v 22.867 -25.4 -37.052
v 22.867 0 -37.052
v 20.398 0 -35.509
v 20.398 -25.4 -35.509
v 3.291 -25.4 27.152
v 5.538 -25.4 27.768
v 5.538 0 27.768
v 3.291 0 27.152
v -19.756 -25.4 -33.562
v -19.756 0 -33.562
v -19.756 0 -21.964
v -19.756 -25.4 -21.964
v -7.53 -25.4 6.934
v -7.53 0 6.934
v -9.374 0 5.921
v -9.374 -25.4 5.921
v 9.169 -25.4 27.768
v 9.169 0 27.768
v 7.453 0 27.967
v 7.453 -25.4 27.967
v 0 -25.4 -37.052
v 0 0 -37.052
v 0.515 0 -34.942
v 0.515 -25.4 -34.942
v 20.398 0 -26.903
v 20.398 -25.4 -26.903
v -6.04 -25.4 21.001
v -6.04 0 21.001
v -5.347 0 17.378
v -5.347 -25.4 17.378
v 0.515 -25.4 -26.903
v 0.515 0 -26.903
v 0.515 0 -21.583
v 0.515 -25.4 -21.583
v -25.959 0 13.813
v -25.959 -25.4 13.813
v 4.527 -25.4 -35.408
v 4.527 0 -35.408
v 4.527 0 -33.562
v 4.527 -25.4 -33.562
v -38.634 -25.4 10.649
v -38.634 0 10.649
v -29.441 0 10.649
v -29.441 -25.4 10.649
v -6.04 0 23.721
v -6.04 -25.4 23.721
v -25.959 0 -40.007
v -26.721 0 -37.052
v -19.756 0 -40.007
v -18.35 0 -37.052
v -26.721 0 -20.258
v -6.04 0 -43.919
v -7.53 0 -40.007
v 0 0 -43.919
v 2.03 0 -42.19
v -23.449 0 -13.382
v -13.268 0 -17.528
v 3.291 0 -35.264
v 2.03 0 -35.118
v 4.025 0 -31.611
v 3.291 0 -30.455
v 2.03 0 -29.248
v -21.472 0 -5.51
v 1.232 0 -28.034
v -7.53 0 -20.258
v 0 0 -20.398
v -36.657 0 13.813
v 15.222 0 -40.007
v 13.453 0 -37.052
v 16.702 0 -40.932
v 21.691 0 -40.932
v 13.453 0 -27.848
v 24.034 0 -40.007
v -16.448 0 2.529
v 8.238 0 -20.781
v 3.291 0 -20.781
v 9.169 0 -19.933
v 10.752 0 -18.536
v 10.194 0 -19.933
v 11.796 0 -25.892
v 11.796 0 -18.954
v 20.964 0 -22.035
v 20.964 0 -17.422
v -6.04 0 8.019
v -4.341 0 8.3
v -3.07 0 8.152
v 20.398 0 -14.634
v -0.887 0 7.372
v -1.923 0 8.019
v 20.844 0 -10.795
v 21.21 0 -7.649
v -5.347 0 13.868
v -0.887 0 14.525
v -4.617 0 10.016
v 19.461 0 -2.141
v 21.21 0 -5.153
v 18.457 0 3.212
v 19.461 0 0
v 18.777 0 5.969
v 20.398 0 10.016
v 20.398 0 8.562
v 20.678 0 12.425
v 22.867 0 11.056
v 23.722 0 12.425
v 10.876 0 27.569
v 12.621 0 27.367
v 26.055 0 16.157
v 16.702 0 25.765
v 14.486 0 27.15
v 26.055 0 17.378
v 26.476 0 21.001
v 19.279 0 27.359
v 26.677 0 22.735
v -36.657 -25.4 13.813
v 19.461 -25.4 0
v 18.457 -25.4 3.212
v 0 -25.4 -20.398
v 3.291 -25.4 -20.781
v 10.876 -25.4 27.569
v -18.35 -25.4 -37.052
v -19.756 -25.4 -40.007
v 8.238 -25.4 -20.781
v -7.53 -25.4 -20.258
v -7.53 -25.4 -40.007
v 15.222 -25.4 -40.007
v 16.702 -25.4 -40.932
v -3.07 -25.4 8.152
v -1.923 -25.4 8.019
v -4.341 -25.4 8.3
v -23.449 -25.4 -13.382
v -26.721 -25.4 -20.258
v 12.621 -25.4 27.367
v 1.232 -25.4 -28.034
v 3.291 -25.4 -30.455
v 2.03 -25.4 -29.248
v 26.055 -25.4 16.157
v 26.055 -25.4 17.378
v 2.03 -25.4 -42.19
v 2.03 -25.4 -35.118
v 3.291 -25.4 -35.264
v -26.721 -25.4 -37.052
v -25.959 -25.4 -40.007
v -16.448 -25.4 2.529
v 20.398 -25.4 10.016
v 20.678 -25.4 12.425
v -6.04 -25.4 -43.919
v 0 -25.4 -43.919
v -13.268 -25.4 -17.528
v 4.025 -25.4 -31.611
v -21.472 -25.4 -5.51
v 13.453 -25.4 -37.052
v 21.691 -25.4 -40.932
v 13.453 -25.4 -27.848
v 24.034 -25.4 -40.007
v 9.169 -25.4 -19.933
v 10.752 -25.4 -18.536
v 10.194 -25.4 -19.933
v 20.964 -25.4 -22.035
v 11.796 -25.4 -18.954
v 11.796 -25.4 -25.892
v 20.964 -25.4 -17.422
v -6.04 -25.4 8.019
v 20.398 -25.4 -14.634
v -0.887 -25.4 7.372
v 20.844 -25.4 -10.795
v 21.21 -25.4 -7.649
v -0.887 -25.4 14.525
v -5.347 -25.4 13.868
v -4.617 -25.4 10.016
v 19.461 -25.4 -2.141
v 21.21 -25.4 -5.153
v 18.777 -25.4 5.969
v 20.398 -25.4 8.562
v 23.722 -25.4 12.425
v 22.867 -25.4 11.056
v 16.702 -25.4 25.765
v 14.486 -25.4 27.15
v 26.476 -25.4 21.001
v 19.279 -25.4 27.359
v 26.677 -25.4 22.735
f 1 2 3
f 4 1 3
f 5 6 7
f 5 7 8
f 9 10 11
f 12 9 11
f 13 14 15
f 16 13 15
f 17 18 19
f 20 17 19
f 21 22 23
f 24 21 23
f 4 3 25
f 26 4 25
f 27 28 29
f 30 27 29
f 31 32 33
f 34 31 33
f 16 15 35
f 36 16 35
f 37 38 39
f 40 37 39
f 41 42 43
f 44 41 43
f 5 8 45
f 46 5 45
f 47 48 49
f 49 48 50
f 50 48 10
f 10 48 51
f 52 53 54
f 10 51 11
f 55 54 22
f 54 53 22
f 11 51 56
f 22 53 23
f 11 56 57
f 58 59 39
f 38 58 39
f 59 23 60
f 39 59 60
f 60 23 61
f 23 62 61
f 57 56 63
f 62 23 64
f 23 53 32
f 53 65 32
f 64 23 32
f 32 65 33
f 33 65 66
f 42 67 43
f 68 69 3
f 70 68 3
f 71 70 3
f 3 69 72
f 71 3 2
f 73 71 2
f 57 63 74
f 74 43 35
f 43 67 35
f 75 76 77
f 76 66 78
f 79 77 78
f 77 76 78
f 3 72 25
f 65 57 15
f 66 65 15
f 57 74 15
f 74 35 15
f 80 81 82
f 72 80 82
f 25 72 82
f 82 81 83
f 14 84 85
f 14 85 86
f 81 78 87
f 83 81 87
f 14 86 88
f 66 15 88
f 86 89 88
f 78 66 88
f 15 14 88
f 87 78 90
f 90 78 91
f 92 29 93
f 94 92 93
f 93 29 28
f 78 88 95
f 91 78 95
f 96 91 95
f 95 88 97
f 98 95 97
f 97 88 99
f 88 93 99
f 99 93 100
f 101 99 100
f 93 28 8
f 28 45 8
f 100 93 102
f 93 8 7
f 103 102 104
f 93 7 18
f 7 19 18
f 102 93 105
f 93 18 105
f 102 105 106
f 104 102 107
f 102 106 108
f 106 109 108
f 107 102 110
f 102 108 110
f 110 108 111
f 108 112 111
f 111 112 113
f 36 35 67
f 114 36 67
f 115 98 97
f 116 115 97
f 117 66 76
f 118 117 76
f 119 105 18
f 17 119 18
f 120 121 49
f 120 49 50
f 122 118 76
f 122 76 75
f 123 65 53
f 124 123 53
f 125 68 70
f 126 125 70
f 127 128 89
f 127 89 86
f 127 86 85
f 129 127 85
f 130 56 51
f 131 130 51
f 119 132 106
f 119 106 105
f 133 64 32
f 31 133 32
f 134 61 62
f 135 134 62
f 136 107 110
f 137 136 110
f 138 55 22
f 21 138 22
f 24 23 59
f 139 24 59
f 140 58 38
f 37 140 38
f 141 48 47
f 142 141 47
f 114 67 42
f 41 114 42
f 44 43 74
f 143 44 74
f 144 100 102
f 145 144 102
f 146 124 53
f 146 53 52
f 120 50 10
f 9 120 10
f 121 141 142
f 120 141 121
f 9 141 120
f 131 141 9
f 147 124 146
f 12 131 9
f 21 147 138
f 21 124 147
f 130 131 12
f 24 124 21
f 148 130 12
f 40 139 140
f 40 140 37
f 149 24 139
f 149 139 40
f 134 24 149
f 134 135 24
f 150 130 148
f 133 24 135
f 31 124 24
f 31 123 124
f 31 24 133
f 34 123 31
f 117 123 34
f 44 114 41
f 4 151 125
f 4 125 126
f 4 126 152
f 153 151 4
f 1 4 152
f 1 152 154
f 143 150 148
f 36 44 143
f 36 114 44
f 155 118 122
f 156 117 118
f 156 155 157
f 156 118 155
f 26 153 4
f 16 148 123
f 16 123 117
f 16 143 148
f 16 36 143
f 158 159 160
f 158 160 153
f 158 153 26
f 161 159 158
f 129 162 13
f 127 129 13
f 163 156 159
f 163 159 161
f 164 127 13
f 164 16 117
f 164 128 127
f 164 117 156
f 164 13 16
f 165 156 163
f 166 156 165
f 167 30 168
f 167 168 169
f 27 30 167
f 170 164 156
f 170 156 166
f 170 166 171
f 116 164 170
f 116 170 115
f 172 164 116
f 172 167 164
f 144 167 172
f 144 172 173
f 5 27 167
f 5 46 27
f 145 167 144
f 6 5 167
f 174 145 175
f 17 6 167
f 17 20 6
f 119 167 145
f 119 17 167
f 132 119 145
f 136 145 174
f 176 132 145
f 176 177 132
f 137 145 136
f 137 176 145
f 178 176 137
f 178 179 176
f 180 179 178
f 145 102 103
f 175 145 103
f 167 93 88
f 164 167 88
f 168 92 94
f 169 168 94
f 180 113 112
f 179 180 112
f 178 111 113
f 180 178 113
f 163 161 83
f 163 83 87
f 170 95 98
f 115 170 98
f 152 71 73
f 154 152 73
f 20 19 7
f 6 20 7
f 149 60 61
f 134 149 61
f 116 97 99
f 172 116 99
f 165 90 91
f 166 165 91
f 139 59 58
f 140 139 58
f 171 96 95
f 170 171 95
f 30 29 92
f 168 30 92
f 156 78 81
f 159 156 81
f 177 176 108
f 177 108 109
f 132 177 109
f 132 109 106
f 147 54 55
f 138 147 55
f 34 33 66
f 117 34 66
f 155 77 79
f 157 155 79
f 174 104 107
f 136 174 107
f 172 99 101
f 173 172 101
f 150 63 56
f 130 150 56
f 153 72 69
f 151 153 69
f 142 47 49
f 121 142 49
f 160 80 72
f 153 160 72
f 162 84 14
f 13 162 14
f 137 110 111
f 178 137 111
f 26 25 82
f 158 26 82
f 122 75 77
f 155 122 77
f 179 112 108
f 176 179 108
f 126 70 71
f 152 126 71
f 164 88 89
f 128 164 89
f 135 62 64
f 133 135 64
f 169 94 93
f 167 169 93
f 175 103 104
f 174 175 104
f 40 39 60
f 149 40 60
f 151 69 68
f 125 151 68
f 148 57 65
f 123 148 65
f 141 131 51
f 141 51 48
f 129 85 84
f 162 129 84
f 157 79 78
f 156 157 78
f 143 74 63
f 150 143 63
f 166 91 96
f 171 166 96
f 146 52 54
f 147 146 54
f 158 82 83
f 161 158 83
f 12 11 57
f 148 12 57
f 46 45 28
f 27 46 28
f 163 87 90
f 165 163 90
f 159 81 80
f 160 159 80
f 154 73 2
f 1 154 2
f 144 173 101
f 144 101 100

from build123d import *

# Parameters (mm, degrees)
F1_DEPTH = 25.4


with BuildPart() as f1:
    # F0 (on Front) → F1 (new body)
    with BuildSketch(Plane.XZ):
        Polygon((-36.657058, 13.813218), (-38.634382, 10.649496), (-29.441338, 10.649496), (-16.448003, 2.52867), (-21.472151, -5.509975), (-23.449069, -13.3819), (-26.721189, -20.258428), (-26.721189, -24.452301), (-26.721189, -37.052132), (-25.958963, -40.006805), (-19.755764, -40.006805), (-18.349815, -37.052132), (-19.755764, -33.562165), (-19.755764, -28.500162), (-19.755764, -21.963648), (-13.268332, -17.527793), (-7.529761, -20.258428), (-7.529761, -37.052132), (-7.529761, -40.006805), (-6.040169, -43.91915), (0, -43.91915), (2.030398, -42.189743), (0, -37.052132), (-0.887454, -32.503918), (-0.887454, -30.455308), (-0.887454, -28.034225), (0, -20.398496), (3.290899, -20.780977), (5.537732, -20.780977), (7.213868, -20.780977), (8.238172, -20.780977), (9.169359, -19.932901), (10.193664, -19.932901), (10.752375, -18.536123), (11.795948, -18.953552), (11.795948, -25.892494), (13.452818, -27.847987), (13.452818, -37.052132), (15.222071, -40.006805), (16.70198, -40.931748), (21.69138, -40.931748), (24.033716, -40.006805), (22.866973, -37.052132), (20.397942, -35.508989), (20.397942, -32.503918), (20.397942, -26.903253), (20.9637, -22.035432), (20.9637, -17.422371), (20.397942, -14.633874), (20.844123, -10.794904), (21.209698, -7.64946), (21.209698, -5.152992), (19.460583, -2.141417), (19.460583, 0), (18.456725, 3.212494), (18.777084, 5.968888), (20.397942, 8.562263), (20.397942, 10.016422), (20.677842, 12.4247), (22.866973, 11.056494), (23.722101, 12.4247), (26.054654, 16.156789), (26.054654, 17.378049), (26.475677, 21.000561), (26.677313, 22.735452), (19.279403, 27.35914), (16.70198, 25.764998), (14.486361, 27.149758), (12.621277, 27.366526), (10.876146, 27.569352), (9.169359, 27.767721), (7.452843, 27.967221), (5.537732, 27.767721), (3.290899, 27.151791), (-6.040169, 23.721304), (-6.040169, 21.000561), (-5.347158, 17.378049), (-5.347158, 13.867774), (-4.617267, 10.016422), (-0.887454, 14.524676), (-0.887454, 7.371743), (-1.922802, 8.018835), (-3.070138, 8.152183), (-4.341321, 8.299925), (-6.040169, 8.018835), (-7.529761, 6.933809), (-9.373561, 5.921237), (-25.958963, 13.813218), align=None)
        Polygon((-0.887454, -32.503918), (0, -37.052132), (0.515232, -34.941698), (2.030398, -35.117797), (3.290899, -35.264297), (4.526607, -35.407916), (4.526607, -34.476705), (4.526607, -33.562165), (4.025185, -31.611435), (3.290899, -30.455308), (2.030398, -29.247591), (1.231548, -28.034225), (0.515232, -26.903253), (0.515232, -24.878059), (0.515232, -23.517057), (0.515232, -21.583002), (0, -20.398496), (-0.887454, -28.034225), (-0.887454, -30.455308), align=None)
    extrude(amount=F1_DEPTH)


solid = f1.part
